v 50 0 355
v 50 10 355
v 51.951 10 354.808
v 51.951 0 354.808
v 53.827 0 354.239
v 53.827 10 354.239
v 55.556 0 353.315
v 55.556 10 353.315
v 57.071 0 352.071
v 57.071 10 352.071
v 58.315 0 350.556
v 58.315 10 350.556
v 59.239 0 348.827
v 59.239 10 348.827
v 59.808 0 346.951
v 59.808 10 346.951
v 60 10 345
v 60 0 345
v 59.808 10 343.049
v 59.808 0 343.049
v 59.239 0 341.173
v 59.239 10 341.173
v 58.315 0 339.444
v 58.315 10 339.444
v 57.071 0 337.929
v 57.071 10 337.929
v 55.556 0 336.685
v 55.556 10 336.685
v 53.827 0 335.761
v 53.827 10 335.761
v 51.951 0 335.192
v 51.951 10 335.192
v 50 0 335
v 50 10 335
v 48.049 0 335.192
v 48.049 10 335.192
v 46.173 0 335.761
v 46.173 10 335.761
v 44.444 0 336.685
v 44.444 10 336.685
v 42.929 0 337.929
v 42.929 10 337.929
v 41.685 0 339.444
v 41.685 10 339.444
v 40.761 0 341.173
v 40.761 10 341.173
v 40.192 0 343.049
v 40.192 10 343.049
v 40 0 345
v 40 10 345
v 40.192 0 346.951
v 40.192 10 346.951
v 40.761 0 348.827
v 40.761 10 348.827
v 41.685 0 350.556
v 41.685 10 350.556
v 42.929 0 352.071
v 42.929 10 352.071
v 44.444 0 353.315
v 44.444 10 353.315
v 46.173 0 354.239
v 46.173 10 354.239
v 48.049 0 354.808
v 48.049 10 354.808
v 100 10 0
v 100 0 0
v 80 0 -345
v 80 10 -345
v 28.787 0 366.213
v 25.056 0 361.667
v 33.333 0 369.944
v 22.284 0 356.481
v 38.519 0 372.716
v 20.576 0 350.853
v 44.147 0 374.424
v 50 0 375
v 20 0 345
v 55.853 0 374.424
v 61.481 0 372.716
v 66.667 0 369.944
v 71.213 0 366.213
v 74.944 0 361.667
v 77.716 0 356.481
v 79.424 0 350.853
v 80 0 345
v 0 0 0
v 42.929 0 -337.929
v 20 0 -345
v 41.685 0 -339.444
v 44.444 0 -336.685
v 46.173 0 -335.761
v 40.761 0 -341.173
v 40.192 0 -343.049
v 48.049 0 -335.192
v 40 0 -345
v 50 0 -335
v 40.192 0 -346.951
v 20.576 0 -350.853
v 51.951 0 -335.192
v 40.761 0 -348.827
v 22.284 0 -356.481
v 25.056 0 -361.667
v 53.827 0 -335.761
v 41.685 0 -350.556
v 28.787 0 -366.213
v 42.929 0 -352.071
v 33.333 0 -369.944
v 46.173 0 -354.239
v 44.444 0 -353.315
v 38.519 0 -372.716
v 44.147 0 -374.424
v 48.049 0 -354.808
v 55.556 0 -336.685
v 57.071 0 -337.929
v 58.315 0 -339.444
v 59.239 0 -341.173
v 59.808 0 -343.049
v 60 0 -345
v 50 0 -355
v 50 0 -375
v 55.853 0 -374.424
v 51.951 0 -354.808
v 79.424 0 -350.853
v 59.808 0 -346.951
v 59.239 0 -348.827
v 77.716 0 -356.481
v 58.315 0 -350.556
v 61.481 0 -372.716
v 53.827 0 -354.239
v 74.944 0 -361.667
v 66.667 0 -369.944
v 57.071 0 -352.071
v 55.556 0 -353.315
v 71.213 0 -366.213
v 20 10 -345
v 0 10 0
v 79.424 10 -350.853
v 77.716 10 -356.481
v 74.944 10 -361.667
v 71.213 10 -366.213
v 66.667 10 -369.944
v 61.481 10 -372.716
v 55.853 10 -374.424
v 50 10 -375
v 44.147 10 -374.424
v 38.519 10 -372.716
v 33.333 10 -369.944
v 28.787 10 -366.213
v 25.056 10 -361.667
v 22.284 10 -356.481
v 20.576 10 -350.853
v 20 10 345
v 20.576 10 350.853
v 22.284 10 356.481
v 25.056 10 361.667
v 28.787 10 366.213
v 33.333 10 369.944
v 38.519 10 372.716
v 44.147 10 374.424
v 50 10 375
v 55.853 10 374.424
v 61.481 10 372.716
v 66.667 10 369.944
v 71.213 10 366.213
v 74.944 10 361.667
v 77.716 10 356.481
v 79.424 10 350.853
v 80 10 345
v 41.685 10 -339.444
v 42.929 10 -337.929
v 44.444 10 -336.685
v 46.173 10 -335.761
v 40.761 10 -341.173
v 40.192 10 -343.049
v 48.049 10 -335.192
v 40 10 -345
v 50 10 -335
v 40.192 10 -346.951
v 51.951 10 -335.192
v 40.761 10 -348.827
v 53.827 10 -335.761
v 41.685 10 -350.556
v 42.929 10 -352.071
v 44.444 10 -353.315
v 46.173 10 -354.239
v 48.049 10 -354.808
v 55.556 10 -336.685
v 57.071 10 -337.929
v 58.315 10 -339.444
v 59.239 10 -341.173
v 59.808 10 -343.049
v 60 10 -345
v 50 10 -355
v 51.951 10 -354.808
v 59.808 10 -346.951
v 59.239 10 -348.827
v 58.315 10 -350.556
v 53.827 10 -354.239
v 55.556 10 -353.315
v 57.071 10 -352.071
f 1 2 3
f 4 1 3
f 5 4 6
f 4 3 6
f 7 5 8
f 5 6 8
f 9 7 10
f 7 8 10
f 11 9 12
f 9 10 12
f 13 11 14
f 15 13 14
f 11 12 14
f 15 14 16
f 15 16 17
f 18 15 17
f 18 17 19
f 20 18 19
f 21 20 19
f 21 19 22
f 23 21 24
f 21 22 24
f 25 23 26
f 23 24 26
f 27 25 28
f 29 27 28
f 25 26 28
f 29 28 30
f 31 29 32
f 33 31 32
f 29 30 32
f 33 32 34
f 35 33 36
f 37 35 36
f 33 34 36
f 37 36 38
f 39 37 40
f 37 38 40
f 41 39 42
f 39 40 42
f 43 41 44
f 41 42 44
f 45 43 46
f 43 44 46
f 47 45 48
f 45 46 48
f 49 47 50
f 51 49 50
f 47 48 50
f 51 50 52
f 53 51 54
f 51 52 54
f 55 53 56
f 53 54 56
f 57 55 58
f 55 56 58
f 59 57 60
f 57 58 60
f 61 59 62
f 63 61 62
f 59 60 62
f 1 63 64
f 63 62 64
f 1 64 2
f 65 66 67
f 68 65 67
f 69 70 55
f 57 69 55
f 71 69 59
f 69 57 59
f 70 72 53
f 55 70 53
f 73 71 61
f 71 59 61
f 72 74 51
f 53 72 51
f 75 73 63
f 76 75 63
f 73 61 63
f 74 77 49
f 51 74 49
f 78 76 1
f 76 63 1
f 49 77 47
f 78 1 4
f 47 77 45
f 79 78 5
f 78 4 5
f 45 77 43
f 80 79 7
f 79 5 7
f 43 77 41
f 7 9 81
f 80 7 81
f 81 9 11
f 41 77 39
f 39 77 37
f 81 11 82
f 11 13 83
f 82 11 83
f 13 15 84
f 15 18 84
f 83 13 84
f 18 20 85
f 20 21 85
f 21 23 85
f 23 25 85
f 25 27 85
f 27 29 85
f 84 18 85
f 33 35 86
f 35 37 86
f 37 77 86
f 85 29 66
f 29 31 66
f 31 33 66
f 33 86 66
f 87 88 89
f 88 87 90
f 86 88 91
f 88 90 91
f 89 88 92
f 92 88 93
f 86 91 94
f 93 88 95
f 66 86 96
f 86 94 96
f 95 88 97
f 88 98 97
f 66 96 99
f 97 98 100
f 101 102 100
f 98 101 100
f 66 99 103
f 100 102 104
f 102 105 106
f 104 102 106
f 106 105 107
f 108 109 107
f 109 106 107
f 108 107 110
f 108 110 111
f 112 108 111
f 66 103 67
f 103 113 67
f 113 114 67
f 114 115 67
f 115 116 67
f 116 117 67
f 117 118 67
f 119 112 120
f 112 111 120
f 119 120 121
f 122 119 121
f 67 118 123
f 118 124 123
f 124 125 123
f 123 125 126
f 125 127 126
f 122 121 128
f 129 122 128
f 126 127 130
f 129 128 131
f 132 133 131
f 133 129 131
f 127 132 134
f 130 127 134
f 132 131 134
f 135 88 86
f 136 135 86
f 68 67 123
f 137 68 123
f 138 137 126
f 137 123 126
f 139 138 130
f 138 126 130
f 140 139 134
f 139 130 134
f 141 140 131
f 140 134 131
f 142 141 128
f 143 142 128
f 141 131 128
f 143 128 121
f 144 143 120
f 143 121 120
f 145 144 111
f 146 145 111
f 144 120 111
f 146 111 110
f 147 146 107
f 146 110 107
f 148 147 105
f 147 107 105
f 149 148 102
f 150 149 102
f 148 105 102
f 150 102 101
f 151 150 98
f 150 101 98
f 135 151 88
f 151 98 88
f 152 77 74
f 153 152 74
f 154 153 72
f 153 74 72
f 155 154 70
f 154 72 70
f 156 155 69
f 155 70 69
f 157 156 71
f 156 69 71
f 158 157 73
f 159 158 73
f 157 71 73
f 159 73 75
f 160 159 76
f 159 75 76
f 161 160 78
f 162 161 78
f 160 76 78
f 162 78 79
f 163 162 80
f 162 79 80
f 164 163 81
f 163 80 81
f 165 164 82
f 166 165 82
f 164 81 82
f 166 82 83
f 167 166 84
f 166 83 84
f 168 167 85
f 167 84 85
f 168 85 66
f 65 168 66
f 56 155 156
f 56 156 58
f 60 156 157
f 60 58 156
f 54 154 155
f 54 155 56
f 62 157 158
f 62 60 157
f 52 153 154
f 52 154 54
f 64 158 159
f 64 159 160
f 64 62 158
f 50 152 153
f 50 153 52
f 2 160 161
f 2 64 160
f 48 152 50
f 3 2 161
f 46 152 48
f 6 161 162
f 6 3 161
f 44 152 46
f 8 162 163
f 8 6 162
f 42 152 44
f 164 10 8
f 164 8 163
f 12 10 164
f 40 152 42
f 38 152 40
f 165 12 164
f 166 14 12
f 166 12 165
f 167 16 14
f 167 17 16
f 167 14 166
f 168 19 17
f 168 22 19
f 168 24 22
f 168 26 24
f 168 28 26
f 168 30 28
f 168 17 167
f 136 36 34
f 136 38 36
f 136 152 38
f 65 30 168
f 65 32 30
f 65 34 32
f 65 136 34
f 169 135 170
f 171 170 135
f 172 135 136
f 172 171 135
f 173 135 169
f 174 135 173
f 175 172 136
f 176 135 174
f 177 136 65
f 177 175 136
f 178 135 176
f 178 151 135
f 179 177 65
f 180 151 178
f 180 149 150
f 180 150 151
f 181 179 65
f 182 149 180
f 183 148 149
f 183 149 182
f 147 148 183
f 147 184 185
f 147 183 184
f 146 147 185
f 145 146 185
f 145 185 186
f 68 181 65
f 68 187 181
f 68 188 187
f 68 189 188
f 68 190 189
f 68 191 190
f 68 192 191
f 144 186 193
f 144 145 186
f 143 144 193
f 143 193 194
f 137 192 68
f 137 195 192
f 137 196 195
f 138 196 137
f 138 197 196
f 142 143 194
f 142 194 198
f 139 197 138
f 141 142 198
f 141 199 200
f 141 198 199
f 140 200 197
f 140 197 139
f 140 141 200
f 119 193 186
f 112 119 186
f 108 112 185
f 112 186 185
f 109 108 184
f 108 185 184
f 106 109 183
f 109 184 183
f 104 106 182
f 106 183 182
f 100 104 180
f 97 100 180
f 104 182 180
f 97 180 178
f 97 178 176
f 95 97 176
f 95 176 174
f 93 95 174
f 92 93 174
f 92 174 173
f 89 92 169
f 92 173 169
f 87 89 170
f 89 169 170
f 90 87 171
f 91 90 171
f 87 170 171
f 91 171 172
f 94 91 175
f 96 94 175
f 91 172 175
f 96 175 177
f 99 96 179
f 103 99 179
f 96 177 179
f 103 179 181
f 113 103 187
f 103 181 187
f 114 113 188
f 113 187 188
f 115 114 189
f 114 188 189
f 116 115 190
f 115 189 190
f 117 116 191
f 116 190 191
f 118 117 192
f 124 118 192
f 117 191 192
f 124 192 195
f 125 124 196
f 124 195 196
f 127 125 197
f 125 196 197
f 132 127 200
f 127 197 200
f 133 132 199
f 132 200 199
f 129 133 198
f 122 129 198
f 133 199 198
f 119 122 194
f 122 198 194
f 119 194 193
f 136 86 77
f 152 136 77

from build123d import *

# Parameters (mm, degrees)
BOSS_EXTRUDE1_DEPTH = 10
SKETCH2_R           = 10
CUT_EXTRUDE1_DEPTH  = 10


with BuildPart() as part:
    # Sketch1 → Boss-Extrude1 (new body)
    with BuildSketch(Plane(origin=(0, 0, 0), x_dir=(1, 0, 0), z_dir=(0, 1, 0))):
        with BuildLine():
            Line((20, 345), (0, 0))
            Line((0, 0), (20, -345))
            ThreePointArc((20, -345), (50, -375), (80, -345))
            Line((80, -345), (100, 0))
            Line((100, 0), (80, 345))
            ThreePointArc((80, 345), (50, 375), (20, 345))
        make_face()
    extrude(amount=BOSS_EXTRUDE1_DEPTH)

    # Sketch2 → Cut-Extrude1 (cut)
    with BuildSketch(Plane(origin=(0, 10, 0), x_dir=(1, 0, 0), z_dir=(0, 1, 0))):
        with Locations(Location((50, -345, 0), (0, 0, 270))):
            Circle(SKETCH2_R)
        with Locations(Location((50, 345, 0), (0, 0, 90))):
            Circle(SKETCH2_R)
    extrude(amount=-CUT_EXTRUDE1_DEPTH, mode=Mode.SUBTRACT)


solid = part.part
